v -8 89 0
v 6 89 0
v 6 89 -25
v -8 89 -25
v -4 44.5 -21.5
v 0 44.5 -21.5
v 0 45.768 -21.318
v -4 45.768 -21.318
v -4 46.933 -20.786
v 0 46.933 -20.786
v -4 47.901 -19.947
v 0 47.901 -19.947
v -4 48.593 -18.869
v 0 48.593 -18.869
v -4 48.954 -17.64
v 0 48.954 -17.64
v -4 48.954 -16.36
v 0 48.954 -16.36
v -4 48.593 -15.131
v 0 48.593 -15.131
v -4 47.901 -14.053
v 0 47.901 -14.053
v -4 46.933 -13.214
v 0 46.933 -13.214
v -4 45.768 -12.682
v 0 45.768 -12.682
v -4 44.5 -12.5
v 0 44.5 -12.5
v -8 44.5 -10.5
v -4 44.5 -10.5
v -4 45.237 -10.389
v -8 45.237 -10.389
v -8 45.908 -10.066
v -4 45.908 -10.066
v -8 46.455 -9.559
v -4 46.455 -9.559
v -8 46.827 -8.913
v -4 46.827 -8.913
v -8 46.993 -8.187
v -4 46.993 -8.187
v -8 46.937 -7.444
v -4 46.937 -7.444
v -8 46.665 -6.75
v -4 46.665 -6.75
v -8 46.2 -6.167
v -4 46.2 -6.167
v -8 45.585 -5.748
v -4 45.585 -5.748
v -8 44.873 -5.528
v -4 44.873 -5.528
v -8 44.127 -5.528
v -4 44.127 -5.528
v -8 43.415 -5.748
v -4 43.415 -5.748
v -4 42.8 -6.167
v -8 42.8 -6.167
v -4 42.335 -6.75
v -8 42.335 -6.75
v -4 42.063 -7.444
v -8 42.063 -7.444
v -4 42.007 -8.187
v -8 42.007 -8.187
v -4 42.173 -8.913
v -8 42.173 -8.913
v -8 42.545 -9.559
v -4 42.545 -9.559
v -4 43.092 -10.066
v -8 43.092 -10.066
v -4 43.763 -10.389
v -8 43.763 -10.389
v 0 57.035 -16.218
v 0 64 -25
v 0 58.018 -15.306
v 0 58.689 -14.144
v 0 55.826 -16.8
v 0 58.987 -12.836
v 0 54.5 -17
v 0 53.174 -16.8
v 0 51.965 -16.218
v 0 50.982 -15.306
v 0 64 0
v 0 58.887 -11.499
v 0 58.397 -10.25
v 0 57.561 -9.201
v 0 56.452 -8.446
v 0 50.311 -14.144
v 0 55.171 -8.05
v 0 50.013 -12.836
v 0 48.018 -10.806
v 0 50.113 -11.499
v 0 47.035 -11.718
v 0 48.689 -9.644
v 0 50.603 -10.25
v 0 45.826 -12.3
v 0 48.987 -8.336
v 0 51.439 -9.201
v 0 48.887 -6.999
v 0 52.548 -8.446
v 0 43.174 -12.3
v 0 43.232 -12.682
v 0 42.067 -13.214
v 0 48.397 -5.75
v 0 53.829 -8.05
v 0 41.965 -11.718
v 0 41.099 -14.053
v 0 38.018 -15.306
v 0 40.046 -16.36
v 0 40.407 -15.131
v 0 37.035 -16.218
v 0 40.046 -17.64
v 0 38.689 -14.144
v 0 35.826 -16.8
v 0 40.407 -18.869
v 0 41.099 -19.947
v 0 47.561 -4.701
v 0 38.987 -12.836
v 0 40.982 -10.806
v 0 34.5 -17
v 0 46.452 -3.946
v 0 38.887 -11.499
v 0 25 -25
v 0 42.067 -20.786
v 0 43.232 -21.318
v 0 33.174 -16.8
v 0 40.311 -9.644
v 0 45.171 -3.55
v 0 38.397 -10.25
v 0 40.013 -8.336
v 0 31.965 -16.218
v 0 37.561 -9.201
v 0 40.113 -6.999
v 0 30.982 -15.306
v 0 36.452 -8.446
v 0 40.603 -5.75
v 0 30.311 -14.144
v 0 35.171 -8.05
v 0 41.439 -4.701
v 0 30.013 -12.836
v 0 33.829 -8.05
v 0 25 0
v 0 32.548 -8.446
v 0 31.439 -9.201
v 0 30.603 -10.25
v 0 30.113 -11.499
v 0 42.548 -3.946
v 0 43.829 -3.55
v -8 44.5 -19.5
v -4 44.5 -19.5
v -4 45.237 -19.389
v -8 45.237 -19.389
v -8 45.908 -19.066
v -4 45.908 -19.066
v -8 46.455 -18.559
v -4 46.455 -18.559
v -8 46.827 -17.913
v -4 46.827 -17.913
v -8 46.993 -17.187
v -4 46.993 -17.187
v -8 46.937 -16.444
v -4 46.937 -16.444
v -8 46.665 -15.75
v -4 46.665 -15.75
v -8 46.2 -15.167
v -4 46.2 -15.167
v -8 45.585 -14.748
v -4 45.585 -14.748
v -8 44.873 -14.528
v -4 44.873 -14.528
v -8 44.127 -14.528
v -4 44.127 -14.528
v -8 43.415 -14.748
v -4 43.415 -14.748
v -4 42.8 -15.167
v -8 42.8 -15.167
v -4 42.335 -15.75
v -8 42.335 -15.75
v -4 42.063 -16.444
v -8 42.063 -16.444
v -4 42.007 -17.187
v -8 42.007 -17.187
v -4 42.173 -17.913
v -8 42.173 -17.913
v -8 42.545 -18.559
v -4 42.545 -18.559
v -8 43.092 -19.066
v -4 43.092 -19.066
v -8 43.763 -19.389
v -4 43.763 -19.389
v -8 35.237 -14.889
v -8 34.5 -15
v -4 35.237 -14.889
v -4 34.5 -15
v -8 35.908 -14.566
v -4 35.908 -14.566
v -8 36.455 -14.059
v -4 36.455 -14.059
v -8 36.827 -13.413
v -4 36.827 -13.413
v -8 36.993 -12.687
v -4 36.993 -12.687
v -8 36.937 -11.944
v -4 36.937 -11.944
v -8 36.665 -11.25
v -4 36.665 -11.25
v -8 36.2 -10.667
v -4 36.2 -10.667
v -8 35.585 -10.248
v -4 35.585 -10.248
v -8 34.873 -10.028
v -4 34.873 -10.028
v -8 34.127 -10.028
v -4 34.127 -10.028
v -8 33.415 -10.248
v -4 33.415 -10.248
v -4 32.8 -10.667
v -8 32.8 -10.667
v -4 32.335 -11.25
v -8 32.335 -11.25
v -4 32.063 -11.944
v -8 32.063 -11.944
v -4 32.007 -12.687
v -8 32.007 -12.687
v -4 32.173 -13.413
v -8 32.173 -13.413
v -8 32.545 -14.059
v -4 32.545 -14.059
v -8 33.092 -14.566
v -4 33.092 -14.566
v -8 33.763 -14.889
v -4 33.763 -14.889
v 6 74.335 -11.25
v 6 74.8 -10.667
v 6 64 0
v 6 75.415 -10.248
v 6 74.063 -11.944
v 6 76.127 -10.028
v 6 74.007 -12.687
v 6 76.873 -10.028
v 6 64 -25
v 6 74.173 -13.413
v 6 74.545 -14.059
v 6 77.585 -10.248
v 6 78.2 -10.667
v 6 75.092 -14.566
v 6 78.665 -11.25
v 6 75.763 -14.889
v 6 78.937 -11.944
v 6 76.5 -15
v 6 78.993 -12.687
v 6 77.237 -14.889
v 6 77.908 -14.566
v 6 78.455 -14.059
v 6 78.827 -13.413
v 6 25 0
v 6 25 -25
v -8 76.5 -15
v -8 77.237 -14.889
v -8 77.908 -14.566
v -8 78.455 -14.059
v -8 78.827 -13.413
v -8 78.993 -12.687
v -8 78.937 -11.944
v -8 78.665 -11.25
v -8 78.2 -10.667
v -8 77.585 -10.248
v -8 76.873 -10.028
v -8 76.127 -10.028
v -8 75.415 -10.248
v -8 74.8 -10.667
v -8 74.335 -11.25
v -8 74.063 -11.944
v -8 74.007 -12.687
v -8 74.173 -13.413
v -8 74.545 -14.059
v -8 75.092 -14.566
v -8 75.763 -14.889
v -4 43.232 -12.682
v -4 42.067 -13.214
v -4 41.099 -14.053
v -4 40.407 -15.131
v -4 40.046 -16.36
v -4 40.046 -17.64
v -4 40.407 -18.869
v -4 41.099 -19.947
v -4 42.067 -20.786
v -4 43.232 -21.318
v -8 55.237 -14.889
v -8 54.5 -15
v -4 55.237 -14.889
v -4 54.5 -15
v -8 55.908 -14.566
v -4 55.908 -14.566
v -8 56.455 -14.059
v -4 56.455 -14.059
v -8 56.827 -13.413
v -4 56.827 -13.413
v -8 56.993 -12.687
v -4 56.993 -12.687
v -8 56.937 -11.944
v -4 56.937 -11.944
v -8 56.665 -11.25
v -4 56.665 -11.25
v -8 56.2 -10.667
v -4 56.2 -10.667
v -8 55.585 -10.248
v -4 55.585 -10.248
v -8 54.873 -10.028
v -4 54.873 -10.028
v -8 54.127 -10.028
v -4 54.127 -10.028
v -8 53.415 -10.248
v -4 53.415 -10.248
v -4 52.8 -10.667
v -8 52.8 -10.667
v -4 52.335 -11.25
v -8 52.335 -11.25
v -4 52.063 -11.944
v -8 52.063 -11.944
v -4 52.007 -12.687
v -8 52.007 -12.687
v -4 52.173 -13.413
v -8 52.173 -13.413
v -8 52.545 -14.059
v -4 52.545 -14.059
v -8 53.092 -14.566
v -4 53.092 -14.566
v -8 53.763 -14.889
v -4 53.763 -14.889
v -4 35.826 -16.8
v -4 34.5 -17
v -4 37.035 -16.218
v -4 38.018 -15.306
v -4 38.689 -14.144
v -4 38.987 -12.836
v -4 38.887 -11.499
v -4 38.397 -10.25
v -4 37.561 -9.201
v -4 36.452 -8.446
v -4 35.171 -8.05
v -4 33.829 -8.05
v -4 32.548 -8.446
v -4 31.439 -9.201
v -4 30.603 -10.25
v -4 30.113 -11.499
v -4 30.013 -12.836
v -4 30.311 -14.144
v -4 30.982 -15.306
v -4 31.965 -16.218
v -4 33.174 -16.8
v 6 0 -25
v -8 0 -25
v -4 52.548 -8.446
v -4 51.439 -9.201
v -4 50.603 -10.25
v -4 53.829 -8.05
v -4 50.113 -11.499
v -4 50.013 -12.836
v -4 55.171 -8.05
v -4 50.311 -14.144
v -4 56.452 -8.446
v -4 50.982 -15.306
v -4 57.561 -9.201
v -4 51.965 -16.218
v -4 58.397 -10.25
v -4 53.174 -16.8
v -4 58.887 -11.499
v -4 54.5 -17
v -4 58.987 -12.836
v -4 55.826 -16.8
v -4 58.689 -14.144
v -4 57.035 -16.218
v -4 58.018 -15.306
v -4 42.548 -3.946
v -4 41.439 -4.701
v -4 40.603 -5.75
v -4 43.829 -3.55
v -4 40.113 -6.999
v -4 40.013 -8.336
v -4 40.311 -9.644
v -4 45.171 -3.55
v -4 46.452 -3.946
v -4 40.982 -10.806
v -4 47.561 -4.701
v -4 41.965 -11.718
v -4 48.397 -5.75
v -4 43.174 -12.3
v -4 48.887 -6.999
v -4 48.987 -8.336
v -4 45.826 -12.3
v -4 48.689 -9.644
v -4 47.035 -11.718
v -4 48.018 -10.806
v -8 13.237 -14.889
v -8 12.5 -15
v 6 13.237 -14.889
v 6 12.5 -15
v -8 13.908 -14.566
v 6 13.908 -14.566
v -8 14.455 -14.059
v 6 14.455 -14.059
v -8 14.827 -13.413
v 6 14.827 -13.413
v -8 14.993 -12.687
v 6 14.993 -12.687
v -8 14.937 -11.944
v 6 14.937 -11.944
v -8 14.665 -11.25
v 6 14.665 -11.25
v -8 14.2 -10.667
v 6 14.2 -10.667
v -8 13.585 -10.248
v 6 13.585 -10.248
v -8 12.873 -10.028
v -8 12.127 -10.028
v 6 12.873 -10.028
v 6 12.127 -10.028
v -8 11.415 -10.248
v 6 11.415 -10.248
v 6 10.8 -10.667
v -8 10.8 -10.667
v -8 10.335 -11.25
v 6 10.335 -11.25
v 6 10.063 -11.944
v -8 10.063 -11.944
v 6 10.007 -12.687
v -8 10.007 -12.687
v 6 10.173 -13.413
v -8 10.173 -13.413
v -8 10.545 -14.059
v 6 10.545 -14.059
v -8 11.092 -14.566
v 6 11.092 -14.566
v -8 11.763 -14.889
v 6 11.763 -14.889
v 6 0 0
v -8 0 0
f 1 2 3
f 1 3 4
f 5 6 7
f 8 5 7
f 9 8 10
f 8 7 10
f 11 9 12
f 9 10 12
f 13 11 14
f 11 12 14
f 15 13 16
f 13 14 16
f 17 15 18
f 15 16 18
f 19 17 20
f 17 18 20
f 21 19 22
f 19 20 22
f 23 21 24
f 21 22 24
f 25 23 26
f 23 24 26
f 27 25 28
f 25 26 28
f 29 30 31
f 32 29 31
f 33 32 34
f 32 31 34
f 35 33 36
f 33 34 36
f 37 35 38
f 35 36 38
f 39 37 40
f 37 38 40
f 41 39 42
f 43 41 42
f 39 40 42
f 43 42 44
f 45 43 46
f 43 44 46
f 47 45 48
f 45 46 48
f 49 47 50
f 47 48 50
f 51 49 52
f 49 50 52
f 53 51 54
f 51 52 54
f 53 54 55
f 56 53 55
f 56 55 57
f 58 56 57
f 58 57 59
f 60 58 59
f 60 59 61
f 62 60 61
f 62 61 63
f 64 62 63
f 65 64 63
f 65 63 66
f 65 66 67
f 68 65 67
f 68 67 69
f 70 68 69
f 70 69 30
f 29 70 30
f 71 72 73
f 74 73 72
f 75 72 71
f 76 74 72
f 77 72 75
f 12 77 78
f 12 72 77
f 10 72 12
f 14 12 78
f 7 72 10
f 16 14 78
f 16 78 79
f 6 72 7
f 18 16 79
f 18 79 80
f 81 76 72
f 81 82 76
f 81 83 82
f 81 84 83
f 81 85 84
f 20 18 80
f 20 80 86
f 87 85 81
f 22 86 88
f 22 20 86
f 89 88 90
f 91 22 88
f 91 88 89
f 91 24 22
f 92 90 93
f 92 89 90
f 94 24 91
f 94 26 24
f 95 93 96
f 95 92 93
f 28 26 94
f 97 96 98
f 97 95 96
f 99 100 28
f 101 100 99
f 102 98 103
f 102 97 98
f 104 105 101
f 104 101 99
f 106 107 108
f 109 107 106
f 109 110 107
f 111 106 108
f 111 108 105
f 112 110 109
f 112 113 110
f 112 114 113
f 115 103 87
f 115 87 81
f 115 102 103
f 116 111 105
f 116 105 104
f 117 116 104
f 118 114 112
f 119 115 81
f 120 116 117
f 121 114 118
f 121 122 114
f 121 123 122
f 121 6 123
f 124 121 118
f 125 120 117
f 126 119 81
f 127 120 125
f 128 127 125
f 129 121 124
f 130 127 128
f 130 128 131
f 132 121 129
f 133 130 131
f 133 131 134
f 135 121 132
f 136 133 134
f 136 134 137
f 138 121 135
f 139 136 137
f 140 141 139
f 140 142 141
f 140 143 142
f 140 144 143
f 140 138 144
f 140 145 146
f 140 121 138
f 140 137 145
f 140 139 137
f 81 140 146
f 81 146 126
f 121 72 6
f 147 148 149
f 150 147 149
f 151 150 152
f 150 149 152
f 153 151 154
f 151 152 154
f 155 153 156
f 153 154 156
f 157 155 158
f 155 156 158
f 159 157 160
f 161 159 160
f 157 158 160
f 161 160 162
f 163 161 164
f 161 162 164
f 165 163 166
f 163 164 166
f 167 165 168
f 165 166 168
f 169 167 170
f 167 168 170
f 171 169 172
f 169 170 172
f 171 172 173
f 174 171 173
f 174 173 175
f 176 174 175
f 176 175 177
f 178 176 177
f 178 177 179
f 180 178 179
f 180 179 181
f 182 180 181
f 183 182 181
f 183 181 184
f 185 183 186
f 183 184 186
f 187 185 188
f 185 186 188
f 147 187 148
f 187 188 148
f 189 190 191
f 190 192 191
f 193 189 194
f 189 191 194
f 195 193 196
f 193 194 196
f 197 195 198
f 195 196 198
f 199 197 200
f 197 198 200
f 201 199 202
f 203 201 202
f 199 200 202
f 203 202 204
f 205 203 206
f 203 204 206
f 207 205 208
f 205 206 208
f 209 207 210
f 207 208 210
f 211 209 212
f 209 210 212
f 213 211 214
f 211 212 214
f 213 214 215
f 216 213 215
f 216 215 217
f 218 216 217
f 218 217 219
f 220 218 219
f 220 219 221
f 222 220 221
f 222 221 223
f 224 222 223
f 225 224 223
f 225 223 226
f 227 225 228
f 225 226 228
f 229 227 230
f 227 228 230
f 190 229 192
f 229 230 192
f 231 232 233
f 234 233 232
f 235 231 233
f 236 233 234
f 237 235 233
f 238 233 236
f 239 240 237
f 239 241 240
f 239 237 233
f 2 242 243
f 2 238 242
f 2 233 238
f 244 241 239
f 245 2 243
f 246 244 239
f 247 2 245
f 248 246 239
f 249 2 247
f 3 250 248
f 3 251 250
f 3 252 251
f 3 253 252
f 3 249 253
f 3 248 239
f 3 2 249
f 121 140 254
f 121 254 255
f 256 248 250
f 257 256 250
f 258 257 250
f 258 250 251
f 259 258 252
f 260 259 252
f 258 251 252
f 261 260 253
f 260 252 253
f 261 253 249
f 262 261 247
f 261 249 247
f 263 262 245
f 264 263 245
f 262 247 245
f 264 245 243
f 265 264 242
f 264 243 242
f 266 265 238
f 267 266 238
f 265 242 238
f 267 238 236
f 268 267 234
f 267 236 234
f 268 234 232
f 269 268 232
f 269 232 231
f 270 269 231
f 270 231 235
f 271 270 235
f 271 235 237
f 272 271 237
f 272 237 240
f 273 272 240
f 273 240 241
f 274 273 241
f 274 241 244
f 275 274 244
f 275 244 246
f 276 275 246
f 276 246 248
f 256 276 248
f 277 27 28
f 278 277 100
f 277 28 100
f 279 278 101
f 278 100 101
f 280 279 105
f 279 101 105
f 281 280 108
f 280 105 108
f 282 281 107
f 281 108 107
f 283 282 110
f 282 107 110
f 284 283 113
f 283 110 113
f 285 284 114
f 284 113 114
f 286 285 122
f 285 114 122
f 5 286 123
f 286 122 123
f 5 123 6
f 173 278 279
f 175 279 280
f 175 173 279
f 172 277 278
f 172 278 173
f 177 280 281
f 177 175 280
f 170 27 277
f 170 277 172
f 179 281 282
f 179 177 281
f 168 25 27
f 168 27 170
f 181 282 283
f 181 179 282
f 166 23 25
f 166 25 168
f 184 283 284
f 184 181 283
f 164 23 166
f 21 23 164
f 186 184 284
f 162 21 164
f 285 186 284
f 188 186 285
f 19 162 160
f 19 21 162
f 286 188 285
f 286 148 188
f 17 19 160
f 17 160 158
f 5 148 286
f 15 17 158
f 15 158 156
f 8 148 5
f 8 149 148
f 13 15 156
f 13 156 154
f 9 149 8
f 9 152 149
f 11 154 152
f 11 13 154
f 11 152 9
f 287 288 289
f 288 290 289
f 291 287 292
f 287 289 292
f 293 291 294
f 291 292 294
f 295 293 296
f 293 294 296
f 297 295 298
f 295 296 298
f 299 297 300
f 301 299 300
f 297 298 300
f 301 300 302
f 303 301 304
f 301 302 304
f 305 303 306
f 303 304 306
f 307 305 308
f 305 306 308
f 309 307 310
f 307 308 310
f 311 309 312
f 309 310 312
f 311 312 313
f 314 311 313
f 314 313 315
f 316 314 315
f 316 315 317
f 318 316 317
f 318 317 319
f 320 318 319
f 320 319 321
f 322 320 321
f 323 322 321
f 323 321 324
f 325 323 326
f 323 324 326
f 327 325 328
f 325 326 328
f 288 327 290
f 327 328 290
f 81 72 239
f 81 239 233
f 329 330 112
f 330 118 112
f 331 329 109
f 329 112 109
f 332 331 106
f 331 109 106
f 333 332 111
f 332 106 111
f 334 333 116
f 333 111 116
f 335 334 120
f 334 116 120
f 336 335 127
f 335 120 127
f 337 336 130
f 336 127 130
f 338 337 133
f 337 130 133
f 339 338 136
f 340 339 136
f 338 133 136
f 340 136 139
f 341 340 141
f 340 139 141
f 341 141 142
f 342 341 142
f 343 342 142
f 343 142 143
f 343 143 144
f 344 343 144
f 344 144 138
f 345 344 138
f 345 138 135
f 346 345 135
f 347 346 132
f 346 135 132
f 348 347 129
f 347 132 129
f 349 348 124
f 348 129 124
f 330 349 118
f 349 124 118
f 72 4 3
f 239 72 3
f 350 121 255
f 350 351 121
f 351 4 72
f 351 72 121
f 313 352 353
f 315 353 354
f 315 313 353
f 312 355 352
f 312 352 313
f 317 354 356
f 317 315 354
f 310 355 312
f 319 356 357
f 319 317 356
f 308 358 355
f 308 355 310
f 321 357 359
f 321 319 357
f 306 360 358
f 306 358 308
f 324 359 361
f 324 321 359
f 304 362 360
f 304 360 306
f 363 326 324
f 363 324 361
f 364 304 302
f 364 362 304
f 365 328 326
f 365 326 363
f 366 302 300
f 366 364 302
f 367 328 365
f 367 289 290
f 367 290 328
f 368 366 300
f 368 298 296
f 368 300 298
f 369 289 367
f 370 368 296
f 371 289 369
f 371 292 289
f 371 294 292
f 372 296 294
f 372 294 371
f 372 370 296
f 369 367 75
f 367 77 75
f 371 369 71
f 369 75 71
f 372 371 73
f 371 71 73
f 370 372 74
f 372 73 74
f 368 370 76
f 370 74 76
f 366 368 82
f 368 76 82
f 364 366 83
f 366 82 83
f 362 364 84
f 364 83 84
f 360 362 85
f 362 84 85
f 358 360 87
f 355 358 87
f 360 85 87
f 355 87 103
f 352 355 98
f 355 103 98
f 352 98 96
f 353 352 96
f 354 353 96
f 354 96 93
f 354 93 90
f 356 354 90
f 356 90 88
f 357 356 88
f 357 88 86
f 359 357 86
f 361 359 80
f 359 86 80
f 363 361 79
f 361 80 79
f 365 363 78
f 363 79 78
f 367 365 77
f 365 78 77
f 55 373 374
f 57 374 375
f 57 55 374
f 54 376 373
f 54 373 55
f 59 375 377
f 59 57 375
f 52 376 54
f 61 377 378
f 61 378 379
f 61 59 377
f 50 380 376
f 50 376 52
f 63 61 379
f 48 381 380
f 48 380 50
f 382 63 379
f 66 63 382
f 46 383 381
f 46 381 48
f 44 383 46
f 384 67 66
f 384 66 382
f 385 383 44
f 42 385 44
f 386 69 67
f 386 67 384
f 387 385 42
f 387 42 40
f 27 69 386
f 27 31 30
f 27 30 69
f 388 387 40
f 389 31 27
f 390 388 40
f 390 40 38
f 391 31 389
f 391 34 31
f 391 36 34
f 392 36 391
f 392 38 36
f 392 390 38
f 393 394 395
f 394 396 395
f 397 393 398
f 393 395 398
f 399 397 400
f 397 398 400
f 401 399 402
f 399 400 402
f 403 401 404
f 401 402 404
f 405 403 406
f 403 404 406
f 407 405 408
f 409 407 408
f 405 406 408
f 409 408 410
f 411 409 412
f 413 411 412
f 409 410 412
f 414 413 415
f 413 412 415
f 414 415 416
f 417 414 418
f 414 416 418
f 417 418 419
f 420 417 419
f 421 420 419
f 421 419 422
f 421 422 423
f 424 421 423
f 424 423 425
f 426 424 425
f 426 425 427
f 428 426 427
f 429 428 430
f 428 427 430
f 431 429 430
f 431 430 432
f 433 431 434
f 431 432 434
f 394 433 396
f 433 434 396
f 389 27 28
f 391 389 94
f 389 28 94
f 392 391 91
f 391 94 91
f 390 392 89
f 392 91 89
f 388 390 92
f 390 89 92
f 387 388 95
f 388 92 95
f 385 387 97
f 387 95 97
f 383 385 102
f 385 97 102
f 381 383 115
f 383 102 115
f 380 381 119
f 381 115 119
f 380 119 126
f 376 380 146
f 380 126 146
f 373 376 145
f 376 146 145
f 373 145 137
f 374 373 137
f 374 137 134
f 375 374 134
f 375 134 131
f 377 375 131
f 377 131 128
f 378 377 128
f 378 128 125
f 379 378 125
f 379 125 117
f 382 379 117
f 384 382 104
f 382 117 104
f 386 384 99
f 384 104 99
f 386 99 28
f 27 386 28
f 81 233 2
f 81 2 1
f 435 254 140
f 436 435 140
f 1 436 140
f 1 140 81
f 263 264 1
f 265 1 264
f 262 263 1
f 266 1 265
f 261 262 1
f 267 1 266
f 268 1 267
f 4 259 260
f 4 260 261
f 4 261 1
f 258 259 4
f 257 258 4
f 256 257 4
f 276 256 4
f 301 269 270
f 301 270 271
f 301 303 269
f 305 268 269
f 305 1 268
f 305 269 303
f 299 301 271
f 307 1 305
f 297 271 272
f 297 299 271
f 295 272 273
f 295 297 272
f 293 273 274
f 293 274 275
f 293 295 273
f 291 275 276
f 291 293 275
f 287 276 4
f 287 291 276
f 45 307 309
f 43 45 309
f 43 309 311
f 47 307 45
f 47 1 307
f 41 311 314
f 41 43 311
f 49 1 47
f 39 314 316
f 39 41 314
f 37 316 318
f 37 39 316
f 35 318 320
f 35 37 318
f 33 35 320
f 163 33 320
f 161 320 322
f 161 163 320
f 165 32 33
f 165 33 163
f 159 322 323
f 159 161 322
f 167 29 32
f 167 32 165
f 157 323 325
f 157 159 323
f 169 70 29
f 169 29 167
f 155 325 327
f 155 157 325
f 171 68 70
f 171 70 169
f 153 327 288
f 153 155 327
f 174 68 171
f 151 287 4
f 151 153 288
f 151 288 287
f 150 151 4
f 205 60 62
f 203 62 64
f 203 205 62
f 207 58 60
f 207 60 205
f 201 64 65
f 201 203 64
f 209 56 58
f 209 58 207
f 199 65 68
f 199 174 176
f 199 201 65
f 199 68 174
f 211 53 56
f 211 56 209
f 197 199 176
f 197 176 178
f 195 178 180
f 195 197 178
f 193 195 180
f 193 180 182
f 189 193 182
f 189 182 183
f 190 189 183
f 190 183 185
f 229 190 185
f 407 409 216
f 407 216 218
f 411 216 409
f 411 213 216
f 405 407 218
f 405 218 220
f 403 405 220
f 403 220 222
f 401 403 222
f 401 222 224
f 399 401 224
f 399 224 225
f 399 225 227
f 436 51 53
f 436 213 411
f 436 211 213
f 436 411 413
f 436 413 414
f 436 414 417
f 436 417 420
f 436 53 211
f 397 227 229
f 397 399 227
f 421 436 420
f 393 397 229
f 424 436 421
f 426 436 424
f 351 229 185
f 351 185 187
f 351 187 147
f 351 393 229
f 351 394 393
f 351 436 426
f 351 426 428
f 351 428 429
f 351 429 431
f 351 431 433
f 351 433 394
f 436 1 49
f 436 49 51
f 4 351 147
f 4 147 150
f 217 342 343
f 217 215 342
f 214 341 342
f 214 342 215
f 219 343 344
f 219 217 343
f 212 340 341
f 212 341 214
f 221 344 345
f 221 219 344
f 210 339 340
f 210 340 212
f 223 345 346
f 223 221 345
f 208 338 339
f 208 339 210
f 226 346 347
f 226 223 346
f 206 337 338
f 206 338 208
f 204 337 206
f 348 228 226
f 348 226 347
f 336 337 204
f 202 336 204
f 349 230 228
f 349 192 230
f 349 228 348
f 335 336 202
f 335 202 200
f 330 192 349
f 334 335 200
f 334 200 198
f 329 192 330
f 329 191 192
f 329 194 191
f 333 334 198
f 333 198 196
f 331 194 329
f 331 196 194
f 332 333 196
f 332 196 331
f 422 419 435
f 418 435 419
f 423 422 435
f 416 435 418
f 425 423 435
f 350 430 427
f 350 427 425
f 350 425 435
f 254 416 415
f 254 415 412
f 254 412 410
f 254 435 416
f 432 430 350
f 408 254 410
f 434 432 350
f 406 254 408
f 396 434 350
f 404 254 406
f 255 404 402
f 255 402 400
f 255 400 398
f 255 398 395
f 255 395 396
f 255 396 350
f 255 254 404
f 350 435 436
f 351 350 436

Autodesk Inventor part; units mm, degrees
ref_plane "YZ Plane" through (0, 0, 0) normal (1, 0, 0) x (0, 1, 0)
ref_plane "XZ Plane" through (0, 0, 0) normal (0, 1, 0) x (-1, 0, 0)
ref_plane "XY Plane" through (0, 0, 0) normal (0, 0, 1) x (1, 0, 0)
sketch "Sketch1" plane through (0, 0, 0) normal (0, 1, 0) x (-1, 0, 0)
  line L0 (0, 0) -> (8, 0)
  line L1 (8, 0) -> (8, -25)
  line L2 (8, -25) -> (0, -25)
  line L3 (0, -25) -> (0, 0)
  dimension "d0" = 8
  dimension "d1" = 25
extrude "Extrusion1" add sketch "Sketch1" along normal blind 89
sketch "Sketch2" plane through (0, 0, 0) normal (1, 0, 0) x (0, 0, -1)
  line L0 (0, 89) -> (25, 89) projected
  line L1 (0, 89) -> (25, 89)
  line L2 (25, 89) -> (25, 64)
  line L3 (25, 64) -> (0, 64)
  line L4 (0, 64) -> (0, 89)
  line L5 (25, 0) -> (25, 89) projected
  line L6 (25, 0) -> (0, 0)
  line L7 (0, 0) -> (0, 25)
  line L8 (0, 25) -> (25, 25)
  line L9 (25, 25) -> (25, 0)
  dimension "d4" = 25
  dimension "d5" = 25
  dimension "d6" = 25
  dimension "d7" = 25
extrude "Extrusion2" add sketch "Sketch2" along normal blind 6
sketch "Sketch3" plane through (6, 0, 0) normal (1, 0, 0) x (0, 0, -1)
  line L0 (0, 0) -> (25, 0) projected
  line L1 (0, 0) -> (12.5, 0)
  line L2 (12.5, 0) -> (12.5, 12.5)
  circle A0 centre (12.5, 12.5) radius 2.5
  circle A1 centre (12.5, 76.5) radius 2.5
  line L3 (25, 89) -> (0, 89) projected
  line L4 (0, 89) -> (0, 64) projected
  dimension "d10" = 12.5
  dimension "d11" = 5
  dimension "d12" = 5
  dimension "d13" = 12.5
  dimension "d14" = 12.5
sketch "Sketch4" plane through (0, 25, -25) normal (1, 0, 0) x (0, 0, -1)
  circle A0 centre (-17, 19.5) radius 2.5
  line L0 (-25, -25) -> (0, -25) projected
  line L1 (-25, 0) -> (-25, 39) projected
  circle A1 centre (-8, 19.5) radius 2.5
  line L2 (0, 0) -> (0, 39) projected
  circle A2 centre (-12.5, 9.5) radius 2.5
  circle A3 centre (-12.5, 29.5) radius 2.5
  dimension "d15" = 5
  dimension "d16" = 44.5
  dimension "d17" = 8
  dimension "d18" = 5
  dimension "d19" = 8
  dimension "d20" = 44.5
  dimension "d21" = 5
  dimension "d22" = 5
  dimension "d23" = 10
  dimension "d24" = 4.5
  dimension "d25" = 10
  dimension "d26" = 4.5
extrude "Extrusion3" cut sketch "Sketch3" against normal up to next
extrude "Extrusion4" cut sketch "Sketch4" against normal up to next
sketch "Sketch5" plane through (0, 25, -25) normal (1, 0, 0) x (0, 0, -1)
  circle A0 centre (-12.5, 29.5) radius 2.5 projected
  circle A1 centre (-12.5, 29.5) radius 4.5
  circle A2 centre (-17, 19.5) radius 2.5 projected
  circle A3 centre (-17, 19.5) radius 4.5
  circle A4 centre (-8, 19.5) radius 2.5 projected
  circle A5 centre (-8, 19.5) radius 4.5
  circle A6 centre (-12.5, 9.5) radius 2.5 projected
  circle A7 centre (-12.5, 9.5) radius 4.5
  point P0 (-25, -25)
  dimension "d31" = 9
  dimension "d32" = 9
  dimension "d33" = 9
  dimension "d34" = 9
extrude "Extrusion5" cut sketch "Sketch5" against normal blind 4
properties part number "Back_Bracket_40mm" material "ABS Plastic"
